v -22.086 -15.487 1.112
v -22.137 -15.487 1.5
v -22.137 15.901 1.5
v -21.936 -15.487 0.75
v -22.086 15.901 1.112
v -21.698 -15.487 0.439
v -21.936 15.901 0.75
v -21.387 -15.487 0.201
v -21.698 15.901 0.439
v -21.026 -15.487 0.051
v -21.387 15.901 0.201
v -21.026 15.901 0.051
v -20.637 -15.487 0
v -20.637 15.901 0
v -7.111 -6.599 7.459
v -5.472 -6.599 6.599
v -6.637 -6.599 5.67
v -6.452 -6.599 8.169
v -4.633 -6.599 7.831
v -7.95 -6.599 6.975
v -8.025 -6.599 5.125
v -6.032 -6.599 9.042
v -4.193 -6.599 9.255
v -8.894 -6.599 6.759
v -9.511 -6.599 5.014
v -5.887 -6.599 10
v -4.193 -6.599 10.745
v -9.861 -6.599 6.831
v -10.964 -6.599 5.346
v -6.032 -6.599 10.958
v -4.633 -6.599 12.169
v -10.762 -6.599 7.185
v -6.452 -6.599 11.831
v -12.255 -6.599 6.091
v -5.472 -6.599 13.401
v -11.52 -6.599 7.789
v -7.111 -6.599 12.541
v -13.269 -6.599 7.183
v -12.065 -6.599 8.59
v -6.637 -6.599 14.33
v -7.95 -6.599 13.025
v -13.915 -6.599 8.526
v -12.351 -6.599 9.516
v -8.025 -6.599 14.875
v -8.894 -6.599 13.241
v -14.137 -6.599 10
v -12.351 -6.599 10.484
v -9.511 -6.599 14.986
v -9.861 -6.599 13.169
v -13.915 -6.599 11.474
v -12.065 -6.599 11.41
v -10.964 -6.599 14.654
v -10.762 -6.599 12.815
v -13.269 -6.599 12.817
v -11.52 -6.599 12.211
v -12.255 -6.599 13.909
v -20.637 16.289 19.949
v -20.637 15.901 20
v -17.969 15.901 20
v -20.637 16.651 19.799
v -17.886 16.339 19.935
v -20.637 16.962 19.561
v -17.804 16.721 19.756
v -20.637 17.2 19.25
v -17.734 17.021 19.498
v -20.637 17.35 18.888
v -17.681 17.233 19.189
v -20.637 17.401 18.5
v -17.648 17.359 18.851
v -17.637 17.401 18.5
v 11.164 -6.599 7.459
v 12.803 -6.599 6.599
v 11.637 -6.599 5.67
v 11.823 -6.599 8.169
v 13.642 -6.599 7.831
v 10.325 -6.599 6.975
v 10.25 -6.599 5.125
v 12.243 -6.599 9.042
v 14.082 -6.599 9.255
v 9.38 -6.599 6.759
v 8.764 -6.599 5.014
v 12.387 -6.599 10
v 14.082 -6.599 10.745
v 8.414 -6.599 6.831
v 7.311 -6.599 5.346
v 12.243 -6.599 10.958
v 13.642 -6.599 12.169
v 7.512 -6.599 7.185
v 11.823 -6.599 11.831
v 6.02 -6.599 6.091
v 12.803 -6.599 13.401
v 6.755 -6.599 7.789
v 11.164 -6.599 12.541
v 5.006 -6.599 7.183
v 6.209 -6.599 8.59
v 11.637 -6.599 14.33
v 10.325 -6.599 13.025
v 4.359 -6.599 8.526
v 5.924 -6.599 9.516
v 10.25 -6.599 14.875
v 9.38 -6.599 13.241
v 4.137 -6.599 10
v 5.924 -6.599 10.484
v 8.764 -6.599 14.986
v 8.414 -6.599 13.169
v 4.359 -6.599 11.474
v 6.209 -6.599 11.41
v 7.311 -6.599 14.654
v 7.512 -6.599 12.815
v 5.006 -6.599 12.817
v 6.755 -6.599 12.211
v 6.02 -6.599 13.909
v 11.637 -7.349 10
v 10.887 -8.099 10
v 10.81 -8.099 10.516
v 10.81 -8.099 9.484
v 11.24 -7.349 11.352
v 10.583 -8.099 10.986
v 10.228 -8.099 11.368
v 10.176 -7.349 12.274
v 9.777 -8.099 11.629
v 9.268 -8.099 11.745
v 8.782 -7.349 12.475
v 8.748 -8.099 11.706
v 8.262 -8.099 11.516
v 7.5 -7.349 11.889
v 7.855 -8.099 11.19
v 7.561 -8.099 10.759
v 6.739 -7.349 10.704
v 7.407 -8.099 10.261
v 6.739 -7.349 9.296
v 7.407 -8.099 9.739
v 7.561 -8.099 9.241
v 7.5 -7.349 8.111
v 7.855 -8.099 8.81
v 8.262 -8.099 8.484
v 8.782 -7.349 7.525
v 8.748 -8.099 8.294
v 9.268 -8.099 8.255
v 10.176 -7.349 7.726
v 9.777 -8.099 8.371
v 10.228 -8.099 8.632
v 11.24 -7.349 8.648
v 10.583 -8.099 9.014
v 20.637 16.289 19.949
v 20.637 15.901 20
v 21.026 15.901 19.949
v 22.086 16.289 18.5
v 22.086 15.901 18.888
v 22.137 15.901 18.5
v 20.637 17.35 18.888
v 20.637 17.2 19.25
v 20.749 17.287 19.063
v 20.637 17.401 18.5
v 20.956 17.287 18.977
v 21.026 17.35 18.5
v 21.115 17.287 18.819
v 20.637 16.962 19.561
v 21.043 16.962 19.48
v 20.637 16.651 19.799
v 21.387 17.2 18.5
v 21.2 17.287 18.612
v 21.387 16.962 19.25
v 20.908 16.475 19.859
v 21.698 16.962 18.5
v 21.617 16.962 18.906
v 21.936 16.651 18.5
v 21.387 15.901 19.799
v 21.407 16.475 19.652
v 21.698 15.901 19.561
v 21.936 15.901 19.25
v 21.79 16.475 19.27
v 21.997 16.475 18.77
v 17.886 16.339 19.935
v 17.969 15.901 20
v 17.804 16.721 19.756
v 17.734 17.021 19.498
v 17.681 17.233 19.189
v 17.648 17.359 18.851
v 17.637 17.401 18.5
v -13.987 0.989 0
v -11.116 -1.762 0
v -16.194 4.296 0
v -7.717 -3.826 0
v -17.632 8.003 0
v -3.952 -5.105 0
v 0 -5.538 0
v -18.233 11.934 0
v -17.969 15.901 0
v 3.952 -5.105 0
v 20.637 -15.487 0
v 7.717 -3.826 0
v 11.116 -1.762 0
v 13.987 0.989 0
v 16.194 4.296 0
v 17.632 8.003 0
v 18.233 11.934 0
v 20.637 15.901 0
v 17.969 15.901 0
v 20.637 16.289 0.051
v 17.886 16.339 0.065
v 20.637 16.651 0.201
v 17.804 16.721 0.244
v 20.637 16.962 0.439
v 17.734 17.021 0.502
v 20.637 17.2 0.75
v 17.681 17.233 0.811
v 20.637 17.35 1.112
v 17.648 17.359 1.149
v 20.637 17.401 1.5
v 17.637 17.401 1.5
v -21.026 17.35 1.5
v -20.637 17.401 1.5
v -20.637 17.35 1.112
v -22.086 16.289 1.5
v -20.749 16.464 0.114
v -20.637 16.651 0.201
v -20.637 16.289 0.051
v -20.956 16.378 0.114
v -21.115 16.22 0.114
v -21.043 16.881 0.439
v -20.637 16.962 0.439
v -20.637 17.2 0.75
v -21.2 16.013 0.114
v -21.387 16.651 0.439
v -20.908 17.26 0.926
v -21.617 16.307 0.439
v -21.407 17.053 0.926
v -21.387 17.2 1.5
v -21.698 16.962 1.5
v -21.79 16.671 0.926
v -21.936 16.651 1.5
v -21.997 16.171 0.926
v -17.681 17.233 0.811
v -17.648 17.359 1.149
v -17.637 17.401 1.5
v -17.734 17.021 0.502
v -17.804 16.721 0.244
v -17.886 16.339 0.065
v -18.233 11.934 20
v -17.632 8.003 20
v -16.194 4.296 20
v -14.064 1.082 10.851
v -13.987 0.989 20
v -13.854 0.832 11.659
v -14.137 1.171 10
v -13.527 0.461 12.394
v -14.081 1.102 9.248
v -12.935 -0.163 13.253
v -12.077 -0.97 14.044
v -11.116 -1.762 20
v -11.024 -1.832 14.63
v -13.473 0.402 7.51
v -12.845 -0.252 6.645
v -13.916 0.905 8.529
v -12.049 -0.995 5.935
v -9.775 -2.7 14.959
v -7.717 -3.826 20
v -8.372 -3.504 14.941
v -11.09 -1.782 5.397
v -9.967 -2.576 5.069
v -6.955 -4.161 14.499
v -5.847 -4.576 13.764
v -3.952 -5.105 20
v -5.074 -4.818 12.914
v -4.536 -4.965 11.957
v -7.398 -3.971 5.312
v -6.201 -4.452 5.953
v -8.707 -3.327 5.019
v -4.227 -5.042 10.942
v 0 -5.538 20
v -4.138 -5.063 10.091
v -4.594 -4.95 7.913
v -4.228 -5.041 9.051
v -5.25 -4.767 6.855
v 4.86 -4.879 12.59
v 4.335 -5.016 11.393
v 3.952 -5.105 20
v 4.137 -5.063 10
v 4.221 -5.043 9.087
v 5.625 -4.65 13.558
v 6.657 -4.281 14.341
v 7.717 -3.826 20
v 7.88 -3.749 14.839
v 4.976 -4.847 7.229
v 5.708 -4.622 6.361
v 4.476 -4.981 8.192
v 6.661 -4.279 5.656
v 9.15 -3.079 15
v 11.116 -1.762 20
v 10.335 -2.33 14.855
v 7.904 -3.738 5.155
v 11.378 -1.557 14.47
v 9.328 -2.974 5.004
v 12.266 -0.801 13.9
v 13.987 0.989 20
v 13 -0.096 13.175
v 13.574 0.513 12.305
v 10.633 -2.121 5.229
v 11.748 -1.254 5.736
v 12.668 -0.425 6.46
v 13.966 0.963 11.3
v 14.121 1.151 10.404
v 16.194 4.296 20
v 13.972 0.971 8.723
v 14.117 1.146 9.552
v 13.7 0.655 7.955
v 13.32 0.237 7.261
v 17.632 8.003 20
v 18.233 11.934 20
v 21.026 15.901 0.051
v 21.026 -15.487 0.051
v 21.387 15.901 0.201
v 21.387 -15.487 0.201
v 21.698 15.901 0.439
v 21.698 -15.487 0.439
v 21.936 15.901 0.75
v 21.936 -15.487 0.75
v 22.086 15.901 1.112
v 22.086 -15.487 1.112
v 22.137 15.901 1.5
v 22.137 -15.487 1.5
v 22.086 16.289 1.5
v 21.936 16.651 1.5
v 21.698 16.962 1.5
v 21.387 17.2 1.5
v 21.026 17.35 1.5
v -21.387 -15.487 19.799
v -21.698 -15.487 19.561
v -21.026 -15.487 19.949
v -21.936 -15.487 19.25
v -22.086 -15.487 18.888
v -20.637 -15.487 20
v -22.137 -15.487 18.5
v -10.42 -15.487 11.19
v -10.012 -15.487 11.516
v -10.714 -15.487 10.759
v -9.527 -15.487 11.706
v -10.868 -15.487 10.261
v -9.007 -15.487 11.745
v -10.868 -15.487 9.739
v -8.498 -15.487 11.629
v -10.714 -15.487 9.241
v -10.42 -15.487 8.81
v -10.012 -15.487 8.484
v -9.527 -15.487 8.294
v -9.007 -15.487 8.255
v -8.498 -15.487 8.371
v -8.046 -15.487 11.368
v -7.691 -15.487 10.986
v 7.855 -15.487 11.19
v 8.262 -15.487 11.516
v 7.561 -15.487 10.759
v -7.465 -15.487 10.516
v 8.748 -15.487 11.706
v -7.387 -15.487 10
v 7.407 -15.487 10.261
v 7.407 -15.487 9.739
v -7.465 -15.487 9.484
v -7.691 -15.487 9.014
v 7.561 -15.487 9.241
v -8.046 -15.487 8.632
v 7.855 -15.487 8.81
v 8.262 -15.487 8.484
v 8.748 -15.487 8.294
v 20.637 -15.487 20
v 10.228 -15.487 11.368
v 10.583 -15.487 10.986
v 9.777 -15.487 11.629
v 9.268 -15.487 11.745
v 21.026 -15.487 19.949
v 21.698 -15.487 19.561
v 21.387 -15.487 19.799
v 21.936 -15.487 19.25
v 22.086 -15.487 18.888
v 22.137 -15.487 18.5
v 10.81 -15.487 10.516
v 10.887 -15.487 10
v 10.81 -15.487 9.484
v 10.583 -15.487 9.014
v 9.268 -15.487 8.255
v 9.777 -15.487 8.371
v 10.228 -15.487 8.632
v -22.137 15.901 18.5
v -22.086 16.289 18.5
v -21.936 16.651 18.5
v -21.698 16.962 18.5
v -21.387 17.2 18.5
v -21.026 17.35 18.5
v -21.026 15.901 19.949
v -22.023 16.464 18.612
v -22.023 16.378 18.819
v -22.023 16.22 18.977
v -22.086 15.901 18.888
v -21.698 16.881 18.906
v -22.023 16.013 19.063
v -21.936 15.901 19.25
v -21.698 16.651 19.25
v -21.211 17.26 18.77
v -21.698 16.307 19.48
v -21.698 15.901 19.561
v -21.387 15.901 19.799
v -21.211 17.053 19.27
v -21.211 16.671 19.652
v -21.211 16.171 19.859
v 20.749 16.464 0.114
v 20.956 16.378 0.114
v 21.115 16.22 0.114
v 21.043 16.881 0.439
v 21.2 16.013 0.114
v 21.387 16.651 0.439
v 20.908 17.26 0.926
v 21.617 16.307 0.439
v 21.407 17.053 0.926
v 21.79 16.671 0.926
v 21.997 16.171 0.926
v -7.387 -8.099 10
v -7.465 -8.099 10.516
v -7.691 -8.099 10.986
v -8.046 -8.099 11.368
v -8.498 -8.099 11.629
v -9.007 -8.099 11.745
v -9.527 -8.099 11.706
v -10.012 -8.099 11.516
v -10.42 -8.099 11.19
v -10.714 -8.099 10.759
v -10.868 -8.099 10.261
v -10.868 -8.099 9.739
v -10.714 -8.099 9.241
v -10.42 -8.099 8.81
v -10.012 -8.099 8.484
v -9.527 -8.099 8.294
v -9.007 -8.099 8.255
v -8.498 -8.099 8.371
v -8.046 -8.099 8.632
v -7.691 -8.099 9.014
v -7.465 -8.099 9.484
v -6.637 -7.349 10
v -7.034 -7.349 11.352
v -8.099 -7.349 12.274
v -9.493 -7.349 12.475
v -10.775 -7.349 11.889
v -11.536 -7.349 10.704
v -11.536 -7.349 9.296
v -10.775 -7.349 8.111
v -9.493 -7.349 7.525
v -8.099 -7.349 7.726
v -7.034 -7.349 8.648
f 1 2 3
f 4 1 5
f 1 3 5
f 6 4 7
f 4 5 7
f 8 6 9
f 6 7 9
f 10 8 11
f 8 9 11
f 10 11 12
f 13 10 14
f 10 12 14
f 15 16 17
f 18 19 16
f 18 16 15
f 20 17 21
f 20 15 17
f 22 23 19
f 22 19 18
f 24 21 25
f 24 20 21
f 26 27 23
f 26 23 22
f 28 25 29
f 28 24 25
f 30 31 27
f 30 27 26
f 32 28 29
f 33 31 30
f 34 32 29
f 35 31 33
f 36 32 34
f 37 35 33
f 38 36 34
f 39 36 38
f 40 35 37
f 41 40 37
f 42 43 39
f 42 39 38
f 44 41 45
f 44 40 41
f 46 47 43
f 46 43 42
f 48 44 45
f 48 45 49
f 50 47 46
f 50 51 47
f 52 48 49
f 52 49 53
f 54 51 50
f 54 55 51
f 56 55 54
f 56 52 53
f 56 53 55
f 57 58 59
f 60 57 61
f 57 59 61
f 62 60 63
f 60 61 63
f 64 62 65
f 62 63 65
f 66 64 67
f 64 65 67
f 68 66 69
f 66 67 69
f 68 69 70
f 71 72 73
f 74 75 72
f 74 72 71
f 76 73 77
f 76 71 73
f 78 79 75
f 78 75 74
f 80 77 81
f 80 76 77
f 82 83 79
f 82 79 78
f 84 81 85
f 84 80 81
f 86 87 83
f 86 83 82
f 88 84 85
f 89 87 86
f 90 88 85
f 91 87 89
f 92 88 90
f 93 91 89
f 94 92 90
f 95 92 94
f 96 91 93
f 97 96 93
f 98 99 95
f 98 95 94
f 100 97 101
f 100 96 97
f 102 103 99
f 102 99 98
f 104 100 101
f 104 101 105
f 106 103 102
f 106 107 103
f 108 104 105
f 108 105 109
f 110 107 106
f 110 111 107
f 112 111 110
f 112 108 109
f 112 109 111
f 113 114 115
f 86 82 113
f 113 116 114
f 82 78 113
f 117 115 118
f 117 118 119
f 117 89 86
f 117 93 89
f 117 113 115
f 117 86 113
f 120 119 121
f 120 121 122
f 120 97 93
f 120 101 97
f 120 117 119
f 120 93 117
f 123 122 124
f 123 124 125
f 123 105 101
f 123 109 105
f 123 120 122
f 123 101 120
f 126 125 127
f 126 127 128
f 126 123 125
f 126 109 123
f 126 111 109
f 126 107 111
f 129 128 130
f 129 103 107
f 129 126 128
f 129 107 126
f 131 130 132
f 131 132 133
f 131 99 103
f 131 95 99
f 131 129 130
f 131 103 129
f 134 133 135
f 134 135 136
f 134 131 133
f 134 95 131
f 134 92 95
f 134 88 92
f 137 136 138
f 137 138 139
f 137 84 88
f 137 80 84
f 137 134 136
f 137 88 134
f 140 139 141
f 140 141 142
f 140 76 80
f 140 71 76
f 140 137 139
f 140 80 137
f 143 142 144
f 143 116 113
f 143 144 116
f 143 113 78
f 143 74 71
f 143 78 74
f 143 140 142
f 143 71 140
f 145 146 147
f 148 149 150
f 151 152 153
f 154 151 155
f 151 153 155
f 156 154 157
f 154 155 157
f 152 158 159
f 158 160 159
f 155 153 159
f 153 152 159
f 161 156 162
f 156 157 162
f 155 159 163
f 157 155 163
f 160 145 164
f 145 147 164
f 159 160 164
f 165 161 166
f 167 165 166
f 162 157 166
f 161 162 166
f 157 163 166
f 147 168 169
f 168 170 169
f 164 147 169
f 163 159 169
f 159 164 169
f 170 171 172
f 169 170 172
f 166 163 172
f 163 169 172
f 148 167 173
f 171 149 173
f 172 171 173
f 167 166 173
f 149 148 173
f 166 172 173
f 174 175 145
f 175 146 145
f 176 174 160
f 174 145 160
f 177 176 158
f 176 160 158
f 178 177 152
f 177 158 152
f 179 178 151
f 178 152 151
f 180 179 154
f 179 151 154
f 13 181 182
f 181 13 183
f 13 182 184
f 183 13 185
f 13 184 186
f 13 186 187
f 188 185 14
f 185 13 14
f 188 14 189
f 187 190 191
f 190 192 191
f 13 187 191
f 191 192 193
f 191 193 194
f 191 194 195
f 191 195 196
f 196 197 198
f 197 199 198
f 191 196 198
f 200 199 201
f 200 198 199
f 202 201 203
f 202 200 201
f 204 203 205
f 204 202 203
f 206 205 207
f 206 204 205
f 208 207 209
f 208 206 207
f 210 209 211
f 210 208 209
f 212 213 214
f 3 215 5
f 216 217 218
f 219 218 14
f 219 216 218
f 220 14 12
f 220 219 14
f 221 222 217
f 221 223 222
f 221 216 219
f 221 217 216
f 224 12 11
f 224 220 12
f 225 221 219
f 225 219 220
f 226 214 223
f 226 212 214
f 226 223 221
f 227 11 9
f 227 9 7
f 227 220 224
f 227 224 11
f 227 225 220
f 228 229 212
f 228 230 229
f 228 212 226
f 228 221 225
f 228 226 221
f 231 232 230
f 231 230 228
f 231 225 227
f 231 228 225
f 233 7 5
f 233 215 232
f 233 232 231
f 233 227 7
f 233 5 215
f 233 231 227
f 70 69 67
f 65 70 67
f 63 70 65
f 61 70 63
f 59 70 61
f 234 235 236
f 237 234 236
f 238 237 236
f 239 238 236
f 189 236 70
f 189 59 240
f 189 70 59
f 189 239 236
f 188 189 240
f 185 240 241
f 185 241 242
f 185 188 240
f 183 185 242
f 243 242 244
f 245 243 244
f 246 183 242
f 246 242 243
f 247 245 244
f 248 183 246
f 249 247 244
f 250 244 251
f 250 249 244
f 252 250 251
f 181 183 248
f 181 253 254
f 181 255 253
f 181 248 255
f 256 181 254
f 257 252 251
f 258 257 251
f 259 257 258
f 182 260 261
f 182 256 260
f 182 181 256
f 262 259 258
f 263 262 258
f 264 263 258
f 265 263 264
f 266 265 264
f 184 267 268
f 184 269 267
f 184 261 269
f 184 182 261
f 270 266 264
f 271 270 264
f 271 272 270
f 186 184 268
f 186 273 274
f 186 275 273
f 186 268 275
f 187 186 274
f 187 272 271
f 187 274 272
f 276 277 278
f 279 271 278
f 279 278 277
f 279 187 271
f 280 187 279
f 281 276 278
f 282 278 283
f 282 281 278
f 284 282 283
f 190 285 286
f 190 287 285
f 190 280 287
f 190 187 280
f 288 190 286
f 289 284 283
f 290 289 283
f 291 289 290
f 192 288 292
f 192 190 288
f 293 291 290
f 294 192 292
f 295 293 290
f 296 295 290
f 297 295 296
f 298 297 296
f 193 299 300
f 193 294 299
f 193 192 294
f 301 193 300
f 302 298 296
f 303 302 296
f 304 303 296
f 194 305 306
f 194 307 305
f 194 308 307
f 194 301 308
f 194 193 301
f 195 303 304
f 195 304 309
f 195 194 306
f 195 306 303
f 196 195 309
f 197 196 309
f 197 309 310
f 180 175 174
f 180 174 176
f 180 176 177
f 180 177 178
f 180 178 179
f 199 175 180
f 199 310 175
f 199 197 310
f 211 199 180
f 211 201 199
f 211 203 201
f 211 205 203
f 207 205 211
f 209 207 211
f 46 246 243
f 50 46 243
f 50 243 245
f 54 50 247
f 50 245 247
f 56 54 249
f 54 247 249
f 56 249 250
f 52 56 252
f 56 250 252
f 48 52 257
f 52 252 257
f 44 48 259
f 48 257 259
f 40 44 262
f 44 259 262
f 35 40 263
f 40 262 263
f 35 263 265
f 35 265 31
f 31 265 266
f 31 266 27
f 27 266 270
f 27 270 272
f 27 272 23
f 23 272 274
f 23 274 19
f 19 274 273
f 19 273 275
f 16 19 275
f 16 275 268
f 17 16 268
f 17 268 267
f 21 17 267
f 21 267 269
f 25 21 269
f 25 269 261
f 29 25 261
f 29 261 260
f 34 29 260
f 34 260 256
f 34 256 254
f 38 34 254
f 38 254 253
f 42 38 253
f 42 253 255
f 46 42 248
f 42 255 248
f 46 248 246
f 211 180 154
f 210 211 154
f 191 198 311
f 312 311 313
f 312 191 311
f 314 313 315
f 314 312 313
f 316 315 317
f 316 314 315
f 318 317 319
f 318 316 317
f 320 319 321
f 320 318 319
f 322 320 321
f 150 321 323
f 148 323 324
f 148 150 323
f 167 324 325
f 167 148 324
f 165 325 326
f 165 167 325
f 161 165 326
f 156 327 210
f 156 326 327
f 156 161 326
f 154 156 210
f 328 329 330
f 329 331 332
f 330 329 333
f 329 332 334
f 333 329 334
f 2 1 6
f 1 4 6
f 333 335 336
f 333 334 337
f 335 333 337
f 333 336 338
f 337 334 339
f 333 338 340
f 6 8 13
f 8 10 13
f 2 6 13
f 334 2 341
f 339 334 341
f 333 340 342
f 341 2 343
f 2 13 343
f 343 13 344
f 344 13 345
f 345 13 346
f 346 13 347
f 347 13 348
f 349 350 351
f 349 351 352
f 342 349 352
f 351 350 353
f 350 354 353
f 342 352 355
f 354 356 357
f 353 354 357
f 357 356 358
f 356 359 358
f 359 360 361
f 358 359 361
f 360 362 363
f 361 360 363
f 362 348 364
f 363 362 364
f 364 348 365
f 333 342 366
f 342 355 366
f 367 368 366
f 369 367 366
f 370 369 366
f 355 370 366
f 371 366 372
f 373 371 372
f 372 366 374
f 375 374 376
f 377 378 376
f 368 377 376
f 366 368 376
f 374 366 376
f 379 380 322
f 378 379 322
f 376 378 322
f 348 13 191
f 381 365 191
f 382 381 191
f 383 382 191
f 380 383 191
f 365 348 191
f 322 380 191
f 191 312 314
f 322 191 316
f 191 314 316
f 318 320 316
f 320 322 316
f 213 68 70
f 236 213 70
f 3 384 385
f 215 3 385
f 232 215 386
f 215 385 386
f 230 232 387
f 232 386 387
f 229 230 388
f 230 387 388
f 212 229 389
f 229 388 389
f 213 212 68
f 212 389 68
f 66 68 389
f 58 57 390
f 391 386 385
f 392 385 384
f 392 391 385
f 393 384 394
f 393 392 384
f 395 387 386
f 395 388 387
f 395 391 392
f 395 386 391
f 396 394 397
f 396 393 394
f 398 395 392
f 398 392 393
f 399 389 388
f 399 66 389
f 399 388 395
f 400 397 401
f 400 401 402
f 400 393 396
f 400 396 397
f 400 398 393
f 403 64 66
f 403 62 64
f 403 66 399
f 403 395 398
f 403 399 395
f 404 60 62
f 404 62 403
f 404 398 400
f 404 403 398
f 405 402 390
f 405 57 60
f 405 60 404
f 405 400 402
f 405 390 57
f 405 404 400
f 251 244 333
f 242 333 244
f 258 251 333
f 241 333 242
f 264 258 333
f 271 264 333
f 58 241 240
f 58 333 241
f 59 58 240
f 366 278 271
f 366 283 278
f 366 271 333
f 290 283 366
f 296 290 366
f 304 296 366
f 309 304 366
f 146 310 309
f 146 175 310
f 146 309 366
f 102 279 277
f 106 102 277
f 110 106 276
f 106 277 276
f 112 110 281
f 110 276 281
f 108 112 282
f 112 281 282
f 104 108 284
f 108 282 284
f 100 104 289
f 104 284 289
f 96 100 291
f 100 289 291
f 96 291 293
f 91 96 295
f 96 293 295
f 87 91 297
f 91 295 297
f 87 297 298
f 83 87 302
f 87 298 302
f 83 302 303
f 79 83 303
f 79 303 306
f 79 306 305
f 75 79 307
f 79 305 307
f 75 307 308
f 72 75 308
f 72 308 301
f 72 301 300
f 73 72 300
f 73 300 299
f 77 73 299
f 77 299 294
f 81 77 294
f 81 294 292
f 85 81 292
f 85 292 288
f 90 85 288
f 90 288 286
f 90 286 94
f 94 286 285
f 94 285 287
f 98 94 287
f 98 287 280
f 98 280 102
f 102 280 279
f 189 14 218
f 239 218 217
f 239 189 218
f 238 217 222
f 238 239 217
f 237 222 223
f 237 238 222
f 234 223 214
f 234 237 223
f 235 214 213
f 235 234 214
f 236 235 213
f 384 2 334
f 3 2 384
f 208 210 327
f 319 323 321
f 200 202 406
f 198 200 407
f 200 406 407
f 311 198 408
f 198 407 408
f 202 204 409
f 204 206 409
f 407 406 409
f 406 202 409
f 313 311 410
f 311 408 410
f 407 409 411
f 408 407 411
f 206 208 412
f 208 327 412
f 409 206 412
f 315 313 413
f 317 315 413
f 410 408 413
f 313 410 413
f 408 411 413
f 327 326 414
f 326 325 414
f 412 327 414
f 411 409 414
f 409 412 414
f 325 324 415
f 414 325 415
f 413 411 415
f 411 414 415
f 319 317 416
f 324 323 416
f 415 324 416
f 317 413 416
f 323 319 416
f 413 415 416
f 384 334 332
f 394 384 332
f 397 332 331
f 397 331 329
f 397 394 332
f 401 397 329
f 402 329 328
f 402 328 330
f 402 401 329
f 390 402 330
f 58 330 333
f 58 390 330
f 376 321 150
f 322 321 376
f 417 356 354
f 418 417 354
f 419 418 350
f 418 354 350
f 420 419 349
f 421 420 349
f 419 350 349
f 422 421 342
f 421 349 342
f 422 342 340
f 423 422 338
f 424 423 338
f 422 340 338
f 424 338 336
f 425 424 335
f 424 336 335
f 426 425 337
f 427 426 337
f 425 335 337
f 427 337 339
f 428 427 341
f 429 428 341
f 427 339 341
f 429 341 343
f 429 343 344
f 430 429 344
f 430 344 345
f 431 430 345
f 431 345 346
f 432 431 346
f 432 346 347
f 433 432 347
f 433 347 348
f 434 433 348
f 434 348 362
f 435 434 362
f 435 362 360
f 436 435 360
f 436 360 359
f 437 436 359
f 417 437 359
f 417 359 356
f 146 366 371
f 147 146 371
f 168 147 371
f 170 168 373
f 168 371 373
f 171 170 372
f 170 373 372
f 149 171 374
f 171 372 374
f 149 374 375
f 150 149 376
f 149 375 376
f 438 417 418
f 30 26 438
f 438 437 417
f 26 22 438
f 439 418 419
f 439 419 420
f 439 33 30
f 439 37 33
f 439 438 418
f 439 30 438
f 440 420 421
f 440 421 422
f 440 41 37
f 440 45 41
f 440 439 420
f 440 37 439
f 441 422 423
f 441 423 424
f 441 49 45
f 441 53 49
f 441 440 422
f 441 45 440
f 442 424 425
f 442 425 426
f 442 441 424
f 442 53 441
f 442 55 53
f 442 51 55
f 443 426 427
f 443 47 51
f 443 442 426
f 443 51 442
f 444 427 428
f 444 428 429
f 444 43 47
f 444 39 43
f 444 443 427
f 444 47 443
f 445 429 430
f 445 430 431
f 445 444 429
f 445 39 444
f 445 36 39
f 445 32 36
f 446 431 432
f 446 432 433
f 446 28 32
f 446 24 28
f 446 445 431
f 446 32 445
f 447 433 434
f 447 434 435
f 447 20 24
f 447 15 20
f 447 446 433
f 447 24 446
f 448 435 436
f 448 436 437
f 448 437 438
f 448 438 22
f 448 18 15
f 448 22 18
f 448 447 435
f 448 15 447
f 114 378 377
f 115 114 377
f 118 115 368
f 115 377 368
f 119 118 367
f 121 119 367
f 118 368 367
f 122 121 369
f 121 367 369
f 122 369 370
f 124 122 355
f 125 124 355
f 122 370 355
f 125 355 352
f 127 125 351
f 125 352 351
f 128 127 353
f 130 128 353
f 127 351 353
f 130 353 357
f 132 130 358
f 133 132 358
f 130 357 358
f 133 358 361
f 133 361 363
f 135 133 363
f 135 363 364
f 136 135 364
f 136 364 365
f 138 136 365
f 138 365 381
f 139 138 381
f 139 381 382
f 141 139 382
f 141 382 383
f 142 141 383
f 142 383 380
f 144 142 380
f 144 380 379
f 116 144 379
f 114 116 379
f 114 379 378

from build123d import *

# Parameters (mm, degrees)
PAD_DEPTH       = 20
SKETCH001_R     = 1.75
POCKET_DEPTH    = 32.88897
SKETCH002_R     = 5
POCKET001_DEPTH = 24
CHAMFER_SIZE    = 1.5
FILLET_R        = 1.5


with BuildPart() as part:
    # Sketch → Pad (new body)
    with BuildSketch(Plane.XY):
        with BuildLine():
            Line((-22.137351, -15.487065), (22.137351, -15.487065))
            Line((22.137351, 17.400905), (22.137351, -15.487065))
            Line((17.637351, 17.400905), (22.137351, 17.400905))
            ThreePointArc((-17.637351, 17.400905), (0, -5.538054), (17.637351, 17.400905))
            Line((-22.137351, 17.400905), (-17.637351, 17.400905))
            Line((-22.137351, -15.487065), (-22.137351, 17.400905))
        make_face()
    extrude(amount=PAD_DEPTH)

    # Sketch001 (on Face1 of Pad) → Pocket (cut, through all)
    with BuildSketch(Plane.XZ.offset(15.487065)):
        with Locations((-9.137351, 10)):
            Circle(SKETCH001_R)
        with Locations((9.137351, 10)):
            Circle(SKETCH001_R)
    extrude(amount=-POCKET_DEPTH, mode=Mode.SUBTRACT)

    # Sketch002 (on Face9 of Pocket) → Pocket001 (cut)
    with BuildSketch(Plane(origin=(0, 17.400905, 0), x_dir=(-1, 0, 0), z_dir=(0, 1, 0))):
        with Locations((-9.137351, 10)):
            Circle(SKETCH002_R)
        with Locations((9.137351, 10)):
            Circle(SKETCH002_R)
    extrude(amount=-POCKET001_DEPTH, mode=Mode.SUBTRACT)

    # Chamfer
    chamfer_edges = [part.edges().sort_by_distance(p)[0] for p in [
        (7.387351, -6.599095, 10),
        (-10.887351, -6.599095, 10),
    ]]
    chamfer(chamfer_edges, length=CHAMFER_SIZE)

    # Fillet
    fillet_edges = [part.edges().sort_by_distance(p)[0] for p in [
        (22.137351, 0.95692, 20),
        (19.887351, 17.400905, 20),
        (22.137351, 17.400905, 10),
        (19.887351, 17.400905, 0),
        (22.137351, 0.95692, 0),
        (-19.887351, 17.400905, 20),
        (-22.137351, 17.400905, 10),
        (-22.137351, 0.95692, 20),
        (-19.887351, 17.400905, 0),
        (-22.137351, 0.95692, 0),
    ]]
    fillet(fillet_edges, radius=FILLET_R)


solid = part.part
